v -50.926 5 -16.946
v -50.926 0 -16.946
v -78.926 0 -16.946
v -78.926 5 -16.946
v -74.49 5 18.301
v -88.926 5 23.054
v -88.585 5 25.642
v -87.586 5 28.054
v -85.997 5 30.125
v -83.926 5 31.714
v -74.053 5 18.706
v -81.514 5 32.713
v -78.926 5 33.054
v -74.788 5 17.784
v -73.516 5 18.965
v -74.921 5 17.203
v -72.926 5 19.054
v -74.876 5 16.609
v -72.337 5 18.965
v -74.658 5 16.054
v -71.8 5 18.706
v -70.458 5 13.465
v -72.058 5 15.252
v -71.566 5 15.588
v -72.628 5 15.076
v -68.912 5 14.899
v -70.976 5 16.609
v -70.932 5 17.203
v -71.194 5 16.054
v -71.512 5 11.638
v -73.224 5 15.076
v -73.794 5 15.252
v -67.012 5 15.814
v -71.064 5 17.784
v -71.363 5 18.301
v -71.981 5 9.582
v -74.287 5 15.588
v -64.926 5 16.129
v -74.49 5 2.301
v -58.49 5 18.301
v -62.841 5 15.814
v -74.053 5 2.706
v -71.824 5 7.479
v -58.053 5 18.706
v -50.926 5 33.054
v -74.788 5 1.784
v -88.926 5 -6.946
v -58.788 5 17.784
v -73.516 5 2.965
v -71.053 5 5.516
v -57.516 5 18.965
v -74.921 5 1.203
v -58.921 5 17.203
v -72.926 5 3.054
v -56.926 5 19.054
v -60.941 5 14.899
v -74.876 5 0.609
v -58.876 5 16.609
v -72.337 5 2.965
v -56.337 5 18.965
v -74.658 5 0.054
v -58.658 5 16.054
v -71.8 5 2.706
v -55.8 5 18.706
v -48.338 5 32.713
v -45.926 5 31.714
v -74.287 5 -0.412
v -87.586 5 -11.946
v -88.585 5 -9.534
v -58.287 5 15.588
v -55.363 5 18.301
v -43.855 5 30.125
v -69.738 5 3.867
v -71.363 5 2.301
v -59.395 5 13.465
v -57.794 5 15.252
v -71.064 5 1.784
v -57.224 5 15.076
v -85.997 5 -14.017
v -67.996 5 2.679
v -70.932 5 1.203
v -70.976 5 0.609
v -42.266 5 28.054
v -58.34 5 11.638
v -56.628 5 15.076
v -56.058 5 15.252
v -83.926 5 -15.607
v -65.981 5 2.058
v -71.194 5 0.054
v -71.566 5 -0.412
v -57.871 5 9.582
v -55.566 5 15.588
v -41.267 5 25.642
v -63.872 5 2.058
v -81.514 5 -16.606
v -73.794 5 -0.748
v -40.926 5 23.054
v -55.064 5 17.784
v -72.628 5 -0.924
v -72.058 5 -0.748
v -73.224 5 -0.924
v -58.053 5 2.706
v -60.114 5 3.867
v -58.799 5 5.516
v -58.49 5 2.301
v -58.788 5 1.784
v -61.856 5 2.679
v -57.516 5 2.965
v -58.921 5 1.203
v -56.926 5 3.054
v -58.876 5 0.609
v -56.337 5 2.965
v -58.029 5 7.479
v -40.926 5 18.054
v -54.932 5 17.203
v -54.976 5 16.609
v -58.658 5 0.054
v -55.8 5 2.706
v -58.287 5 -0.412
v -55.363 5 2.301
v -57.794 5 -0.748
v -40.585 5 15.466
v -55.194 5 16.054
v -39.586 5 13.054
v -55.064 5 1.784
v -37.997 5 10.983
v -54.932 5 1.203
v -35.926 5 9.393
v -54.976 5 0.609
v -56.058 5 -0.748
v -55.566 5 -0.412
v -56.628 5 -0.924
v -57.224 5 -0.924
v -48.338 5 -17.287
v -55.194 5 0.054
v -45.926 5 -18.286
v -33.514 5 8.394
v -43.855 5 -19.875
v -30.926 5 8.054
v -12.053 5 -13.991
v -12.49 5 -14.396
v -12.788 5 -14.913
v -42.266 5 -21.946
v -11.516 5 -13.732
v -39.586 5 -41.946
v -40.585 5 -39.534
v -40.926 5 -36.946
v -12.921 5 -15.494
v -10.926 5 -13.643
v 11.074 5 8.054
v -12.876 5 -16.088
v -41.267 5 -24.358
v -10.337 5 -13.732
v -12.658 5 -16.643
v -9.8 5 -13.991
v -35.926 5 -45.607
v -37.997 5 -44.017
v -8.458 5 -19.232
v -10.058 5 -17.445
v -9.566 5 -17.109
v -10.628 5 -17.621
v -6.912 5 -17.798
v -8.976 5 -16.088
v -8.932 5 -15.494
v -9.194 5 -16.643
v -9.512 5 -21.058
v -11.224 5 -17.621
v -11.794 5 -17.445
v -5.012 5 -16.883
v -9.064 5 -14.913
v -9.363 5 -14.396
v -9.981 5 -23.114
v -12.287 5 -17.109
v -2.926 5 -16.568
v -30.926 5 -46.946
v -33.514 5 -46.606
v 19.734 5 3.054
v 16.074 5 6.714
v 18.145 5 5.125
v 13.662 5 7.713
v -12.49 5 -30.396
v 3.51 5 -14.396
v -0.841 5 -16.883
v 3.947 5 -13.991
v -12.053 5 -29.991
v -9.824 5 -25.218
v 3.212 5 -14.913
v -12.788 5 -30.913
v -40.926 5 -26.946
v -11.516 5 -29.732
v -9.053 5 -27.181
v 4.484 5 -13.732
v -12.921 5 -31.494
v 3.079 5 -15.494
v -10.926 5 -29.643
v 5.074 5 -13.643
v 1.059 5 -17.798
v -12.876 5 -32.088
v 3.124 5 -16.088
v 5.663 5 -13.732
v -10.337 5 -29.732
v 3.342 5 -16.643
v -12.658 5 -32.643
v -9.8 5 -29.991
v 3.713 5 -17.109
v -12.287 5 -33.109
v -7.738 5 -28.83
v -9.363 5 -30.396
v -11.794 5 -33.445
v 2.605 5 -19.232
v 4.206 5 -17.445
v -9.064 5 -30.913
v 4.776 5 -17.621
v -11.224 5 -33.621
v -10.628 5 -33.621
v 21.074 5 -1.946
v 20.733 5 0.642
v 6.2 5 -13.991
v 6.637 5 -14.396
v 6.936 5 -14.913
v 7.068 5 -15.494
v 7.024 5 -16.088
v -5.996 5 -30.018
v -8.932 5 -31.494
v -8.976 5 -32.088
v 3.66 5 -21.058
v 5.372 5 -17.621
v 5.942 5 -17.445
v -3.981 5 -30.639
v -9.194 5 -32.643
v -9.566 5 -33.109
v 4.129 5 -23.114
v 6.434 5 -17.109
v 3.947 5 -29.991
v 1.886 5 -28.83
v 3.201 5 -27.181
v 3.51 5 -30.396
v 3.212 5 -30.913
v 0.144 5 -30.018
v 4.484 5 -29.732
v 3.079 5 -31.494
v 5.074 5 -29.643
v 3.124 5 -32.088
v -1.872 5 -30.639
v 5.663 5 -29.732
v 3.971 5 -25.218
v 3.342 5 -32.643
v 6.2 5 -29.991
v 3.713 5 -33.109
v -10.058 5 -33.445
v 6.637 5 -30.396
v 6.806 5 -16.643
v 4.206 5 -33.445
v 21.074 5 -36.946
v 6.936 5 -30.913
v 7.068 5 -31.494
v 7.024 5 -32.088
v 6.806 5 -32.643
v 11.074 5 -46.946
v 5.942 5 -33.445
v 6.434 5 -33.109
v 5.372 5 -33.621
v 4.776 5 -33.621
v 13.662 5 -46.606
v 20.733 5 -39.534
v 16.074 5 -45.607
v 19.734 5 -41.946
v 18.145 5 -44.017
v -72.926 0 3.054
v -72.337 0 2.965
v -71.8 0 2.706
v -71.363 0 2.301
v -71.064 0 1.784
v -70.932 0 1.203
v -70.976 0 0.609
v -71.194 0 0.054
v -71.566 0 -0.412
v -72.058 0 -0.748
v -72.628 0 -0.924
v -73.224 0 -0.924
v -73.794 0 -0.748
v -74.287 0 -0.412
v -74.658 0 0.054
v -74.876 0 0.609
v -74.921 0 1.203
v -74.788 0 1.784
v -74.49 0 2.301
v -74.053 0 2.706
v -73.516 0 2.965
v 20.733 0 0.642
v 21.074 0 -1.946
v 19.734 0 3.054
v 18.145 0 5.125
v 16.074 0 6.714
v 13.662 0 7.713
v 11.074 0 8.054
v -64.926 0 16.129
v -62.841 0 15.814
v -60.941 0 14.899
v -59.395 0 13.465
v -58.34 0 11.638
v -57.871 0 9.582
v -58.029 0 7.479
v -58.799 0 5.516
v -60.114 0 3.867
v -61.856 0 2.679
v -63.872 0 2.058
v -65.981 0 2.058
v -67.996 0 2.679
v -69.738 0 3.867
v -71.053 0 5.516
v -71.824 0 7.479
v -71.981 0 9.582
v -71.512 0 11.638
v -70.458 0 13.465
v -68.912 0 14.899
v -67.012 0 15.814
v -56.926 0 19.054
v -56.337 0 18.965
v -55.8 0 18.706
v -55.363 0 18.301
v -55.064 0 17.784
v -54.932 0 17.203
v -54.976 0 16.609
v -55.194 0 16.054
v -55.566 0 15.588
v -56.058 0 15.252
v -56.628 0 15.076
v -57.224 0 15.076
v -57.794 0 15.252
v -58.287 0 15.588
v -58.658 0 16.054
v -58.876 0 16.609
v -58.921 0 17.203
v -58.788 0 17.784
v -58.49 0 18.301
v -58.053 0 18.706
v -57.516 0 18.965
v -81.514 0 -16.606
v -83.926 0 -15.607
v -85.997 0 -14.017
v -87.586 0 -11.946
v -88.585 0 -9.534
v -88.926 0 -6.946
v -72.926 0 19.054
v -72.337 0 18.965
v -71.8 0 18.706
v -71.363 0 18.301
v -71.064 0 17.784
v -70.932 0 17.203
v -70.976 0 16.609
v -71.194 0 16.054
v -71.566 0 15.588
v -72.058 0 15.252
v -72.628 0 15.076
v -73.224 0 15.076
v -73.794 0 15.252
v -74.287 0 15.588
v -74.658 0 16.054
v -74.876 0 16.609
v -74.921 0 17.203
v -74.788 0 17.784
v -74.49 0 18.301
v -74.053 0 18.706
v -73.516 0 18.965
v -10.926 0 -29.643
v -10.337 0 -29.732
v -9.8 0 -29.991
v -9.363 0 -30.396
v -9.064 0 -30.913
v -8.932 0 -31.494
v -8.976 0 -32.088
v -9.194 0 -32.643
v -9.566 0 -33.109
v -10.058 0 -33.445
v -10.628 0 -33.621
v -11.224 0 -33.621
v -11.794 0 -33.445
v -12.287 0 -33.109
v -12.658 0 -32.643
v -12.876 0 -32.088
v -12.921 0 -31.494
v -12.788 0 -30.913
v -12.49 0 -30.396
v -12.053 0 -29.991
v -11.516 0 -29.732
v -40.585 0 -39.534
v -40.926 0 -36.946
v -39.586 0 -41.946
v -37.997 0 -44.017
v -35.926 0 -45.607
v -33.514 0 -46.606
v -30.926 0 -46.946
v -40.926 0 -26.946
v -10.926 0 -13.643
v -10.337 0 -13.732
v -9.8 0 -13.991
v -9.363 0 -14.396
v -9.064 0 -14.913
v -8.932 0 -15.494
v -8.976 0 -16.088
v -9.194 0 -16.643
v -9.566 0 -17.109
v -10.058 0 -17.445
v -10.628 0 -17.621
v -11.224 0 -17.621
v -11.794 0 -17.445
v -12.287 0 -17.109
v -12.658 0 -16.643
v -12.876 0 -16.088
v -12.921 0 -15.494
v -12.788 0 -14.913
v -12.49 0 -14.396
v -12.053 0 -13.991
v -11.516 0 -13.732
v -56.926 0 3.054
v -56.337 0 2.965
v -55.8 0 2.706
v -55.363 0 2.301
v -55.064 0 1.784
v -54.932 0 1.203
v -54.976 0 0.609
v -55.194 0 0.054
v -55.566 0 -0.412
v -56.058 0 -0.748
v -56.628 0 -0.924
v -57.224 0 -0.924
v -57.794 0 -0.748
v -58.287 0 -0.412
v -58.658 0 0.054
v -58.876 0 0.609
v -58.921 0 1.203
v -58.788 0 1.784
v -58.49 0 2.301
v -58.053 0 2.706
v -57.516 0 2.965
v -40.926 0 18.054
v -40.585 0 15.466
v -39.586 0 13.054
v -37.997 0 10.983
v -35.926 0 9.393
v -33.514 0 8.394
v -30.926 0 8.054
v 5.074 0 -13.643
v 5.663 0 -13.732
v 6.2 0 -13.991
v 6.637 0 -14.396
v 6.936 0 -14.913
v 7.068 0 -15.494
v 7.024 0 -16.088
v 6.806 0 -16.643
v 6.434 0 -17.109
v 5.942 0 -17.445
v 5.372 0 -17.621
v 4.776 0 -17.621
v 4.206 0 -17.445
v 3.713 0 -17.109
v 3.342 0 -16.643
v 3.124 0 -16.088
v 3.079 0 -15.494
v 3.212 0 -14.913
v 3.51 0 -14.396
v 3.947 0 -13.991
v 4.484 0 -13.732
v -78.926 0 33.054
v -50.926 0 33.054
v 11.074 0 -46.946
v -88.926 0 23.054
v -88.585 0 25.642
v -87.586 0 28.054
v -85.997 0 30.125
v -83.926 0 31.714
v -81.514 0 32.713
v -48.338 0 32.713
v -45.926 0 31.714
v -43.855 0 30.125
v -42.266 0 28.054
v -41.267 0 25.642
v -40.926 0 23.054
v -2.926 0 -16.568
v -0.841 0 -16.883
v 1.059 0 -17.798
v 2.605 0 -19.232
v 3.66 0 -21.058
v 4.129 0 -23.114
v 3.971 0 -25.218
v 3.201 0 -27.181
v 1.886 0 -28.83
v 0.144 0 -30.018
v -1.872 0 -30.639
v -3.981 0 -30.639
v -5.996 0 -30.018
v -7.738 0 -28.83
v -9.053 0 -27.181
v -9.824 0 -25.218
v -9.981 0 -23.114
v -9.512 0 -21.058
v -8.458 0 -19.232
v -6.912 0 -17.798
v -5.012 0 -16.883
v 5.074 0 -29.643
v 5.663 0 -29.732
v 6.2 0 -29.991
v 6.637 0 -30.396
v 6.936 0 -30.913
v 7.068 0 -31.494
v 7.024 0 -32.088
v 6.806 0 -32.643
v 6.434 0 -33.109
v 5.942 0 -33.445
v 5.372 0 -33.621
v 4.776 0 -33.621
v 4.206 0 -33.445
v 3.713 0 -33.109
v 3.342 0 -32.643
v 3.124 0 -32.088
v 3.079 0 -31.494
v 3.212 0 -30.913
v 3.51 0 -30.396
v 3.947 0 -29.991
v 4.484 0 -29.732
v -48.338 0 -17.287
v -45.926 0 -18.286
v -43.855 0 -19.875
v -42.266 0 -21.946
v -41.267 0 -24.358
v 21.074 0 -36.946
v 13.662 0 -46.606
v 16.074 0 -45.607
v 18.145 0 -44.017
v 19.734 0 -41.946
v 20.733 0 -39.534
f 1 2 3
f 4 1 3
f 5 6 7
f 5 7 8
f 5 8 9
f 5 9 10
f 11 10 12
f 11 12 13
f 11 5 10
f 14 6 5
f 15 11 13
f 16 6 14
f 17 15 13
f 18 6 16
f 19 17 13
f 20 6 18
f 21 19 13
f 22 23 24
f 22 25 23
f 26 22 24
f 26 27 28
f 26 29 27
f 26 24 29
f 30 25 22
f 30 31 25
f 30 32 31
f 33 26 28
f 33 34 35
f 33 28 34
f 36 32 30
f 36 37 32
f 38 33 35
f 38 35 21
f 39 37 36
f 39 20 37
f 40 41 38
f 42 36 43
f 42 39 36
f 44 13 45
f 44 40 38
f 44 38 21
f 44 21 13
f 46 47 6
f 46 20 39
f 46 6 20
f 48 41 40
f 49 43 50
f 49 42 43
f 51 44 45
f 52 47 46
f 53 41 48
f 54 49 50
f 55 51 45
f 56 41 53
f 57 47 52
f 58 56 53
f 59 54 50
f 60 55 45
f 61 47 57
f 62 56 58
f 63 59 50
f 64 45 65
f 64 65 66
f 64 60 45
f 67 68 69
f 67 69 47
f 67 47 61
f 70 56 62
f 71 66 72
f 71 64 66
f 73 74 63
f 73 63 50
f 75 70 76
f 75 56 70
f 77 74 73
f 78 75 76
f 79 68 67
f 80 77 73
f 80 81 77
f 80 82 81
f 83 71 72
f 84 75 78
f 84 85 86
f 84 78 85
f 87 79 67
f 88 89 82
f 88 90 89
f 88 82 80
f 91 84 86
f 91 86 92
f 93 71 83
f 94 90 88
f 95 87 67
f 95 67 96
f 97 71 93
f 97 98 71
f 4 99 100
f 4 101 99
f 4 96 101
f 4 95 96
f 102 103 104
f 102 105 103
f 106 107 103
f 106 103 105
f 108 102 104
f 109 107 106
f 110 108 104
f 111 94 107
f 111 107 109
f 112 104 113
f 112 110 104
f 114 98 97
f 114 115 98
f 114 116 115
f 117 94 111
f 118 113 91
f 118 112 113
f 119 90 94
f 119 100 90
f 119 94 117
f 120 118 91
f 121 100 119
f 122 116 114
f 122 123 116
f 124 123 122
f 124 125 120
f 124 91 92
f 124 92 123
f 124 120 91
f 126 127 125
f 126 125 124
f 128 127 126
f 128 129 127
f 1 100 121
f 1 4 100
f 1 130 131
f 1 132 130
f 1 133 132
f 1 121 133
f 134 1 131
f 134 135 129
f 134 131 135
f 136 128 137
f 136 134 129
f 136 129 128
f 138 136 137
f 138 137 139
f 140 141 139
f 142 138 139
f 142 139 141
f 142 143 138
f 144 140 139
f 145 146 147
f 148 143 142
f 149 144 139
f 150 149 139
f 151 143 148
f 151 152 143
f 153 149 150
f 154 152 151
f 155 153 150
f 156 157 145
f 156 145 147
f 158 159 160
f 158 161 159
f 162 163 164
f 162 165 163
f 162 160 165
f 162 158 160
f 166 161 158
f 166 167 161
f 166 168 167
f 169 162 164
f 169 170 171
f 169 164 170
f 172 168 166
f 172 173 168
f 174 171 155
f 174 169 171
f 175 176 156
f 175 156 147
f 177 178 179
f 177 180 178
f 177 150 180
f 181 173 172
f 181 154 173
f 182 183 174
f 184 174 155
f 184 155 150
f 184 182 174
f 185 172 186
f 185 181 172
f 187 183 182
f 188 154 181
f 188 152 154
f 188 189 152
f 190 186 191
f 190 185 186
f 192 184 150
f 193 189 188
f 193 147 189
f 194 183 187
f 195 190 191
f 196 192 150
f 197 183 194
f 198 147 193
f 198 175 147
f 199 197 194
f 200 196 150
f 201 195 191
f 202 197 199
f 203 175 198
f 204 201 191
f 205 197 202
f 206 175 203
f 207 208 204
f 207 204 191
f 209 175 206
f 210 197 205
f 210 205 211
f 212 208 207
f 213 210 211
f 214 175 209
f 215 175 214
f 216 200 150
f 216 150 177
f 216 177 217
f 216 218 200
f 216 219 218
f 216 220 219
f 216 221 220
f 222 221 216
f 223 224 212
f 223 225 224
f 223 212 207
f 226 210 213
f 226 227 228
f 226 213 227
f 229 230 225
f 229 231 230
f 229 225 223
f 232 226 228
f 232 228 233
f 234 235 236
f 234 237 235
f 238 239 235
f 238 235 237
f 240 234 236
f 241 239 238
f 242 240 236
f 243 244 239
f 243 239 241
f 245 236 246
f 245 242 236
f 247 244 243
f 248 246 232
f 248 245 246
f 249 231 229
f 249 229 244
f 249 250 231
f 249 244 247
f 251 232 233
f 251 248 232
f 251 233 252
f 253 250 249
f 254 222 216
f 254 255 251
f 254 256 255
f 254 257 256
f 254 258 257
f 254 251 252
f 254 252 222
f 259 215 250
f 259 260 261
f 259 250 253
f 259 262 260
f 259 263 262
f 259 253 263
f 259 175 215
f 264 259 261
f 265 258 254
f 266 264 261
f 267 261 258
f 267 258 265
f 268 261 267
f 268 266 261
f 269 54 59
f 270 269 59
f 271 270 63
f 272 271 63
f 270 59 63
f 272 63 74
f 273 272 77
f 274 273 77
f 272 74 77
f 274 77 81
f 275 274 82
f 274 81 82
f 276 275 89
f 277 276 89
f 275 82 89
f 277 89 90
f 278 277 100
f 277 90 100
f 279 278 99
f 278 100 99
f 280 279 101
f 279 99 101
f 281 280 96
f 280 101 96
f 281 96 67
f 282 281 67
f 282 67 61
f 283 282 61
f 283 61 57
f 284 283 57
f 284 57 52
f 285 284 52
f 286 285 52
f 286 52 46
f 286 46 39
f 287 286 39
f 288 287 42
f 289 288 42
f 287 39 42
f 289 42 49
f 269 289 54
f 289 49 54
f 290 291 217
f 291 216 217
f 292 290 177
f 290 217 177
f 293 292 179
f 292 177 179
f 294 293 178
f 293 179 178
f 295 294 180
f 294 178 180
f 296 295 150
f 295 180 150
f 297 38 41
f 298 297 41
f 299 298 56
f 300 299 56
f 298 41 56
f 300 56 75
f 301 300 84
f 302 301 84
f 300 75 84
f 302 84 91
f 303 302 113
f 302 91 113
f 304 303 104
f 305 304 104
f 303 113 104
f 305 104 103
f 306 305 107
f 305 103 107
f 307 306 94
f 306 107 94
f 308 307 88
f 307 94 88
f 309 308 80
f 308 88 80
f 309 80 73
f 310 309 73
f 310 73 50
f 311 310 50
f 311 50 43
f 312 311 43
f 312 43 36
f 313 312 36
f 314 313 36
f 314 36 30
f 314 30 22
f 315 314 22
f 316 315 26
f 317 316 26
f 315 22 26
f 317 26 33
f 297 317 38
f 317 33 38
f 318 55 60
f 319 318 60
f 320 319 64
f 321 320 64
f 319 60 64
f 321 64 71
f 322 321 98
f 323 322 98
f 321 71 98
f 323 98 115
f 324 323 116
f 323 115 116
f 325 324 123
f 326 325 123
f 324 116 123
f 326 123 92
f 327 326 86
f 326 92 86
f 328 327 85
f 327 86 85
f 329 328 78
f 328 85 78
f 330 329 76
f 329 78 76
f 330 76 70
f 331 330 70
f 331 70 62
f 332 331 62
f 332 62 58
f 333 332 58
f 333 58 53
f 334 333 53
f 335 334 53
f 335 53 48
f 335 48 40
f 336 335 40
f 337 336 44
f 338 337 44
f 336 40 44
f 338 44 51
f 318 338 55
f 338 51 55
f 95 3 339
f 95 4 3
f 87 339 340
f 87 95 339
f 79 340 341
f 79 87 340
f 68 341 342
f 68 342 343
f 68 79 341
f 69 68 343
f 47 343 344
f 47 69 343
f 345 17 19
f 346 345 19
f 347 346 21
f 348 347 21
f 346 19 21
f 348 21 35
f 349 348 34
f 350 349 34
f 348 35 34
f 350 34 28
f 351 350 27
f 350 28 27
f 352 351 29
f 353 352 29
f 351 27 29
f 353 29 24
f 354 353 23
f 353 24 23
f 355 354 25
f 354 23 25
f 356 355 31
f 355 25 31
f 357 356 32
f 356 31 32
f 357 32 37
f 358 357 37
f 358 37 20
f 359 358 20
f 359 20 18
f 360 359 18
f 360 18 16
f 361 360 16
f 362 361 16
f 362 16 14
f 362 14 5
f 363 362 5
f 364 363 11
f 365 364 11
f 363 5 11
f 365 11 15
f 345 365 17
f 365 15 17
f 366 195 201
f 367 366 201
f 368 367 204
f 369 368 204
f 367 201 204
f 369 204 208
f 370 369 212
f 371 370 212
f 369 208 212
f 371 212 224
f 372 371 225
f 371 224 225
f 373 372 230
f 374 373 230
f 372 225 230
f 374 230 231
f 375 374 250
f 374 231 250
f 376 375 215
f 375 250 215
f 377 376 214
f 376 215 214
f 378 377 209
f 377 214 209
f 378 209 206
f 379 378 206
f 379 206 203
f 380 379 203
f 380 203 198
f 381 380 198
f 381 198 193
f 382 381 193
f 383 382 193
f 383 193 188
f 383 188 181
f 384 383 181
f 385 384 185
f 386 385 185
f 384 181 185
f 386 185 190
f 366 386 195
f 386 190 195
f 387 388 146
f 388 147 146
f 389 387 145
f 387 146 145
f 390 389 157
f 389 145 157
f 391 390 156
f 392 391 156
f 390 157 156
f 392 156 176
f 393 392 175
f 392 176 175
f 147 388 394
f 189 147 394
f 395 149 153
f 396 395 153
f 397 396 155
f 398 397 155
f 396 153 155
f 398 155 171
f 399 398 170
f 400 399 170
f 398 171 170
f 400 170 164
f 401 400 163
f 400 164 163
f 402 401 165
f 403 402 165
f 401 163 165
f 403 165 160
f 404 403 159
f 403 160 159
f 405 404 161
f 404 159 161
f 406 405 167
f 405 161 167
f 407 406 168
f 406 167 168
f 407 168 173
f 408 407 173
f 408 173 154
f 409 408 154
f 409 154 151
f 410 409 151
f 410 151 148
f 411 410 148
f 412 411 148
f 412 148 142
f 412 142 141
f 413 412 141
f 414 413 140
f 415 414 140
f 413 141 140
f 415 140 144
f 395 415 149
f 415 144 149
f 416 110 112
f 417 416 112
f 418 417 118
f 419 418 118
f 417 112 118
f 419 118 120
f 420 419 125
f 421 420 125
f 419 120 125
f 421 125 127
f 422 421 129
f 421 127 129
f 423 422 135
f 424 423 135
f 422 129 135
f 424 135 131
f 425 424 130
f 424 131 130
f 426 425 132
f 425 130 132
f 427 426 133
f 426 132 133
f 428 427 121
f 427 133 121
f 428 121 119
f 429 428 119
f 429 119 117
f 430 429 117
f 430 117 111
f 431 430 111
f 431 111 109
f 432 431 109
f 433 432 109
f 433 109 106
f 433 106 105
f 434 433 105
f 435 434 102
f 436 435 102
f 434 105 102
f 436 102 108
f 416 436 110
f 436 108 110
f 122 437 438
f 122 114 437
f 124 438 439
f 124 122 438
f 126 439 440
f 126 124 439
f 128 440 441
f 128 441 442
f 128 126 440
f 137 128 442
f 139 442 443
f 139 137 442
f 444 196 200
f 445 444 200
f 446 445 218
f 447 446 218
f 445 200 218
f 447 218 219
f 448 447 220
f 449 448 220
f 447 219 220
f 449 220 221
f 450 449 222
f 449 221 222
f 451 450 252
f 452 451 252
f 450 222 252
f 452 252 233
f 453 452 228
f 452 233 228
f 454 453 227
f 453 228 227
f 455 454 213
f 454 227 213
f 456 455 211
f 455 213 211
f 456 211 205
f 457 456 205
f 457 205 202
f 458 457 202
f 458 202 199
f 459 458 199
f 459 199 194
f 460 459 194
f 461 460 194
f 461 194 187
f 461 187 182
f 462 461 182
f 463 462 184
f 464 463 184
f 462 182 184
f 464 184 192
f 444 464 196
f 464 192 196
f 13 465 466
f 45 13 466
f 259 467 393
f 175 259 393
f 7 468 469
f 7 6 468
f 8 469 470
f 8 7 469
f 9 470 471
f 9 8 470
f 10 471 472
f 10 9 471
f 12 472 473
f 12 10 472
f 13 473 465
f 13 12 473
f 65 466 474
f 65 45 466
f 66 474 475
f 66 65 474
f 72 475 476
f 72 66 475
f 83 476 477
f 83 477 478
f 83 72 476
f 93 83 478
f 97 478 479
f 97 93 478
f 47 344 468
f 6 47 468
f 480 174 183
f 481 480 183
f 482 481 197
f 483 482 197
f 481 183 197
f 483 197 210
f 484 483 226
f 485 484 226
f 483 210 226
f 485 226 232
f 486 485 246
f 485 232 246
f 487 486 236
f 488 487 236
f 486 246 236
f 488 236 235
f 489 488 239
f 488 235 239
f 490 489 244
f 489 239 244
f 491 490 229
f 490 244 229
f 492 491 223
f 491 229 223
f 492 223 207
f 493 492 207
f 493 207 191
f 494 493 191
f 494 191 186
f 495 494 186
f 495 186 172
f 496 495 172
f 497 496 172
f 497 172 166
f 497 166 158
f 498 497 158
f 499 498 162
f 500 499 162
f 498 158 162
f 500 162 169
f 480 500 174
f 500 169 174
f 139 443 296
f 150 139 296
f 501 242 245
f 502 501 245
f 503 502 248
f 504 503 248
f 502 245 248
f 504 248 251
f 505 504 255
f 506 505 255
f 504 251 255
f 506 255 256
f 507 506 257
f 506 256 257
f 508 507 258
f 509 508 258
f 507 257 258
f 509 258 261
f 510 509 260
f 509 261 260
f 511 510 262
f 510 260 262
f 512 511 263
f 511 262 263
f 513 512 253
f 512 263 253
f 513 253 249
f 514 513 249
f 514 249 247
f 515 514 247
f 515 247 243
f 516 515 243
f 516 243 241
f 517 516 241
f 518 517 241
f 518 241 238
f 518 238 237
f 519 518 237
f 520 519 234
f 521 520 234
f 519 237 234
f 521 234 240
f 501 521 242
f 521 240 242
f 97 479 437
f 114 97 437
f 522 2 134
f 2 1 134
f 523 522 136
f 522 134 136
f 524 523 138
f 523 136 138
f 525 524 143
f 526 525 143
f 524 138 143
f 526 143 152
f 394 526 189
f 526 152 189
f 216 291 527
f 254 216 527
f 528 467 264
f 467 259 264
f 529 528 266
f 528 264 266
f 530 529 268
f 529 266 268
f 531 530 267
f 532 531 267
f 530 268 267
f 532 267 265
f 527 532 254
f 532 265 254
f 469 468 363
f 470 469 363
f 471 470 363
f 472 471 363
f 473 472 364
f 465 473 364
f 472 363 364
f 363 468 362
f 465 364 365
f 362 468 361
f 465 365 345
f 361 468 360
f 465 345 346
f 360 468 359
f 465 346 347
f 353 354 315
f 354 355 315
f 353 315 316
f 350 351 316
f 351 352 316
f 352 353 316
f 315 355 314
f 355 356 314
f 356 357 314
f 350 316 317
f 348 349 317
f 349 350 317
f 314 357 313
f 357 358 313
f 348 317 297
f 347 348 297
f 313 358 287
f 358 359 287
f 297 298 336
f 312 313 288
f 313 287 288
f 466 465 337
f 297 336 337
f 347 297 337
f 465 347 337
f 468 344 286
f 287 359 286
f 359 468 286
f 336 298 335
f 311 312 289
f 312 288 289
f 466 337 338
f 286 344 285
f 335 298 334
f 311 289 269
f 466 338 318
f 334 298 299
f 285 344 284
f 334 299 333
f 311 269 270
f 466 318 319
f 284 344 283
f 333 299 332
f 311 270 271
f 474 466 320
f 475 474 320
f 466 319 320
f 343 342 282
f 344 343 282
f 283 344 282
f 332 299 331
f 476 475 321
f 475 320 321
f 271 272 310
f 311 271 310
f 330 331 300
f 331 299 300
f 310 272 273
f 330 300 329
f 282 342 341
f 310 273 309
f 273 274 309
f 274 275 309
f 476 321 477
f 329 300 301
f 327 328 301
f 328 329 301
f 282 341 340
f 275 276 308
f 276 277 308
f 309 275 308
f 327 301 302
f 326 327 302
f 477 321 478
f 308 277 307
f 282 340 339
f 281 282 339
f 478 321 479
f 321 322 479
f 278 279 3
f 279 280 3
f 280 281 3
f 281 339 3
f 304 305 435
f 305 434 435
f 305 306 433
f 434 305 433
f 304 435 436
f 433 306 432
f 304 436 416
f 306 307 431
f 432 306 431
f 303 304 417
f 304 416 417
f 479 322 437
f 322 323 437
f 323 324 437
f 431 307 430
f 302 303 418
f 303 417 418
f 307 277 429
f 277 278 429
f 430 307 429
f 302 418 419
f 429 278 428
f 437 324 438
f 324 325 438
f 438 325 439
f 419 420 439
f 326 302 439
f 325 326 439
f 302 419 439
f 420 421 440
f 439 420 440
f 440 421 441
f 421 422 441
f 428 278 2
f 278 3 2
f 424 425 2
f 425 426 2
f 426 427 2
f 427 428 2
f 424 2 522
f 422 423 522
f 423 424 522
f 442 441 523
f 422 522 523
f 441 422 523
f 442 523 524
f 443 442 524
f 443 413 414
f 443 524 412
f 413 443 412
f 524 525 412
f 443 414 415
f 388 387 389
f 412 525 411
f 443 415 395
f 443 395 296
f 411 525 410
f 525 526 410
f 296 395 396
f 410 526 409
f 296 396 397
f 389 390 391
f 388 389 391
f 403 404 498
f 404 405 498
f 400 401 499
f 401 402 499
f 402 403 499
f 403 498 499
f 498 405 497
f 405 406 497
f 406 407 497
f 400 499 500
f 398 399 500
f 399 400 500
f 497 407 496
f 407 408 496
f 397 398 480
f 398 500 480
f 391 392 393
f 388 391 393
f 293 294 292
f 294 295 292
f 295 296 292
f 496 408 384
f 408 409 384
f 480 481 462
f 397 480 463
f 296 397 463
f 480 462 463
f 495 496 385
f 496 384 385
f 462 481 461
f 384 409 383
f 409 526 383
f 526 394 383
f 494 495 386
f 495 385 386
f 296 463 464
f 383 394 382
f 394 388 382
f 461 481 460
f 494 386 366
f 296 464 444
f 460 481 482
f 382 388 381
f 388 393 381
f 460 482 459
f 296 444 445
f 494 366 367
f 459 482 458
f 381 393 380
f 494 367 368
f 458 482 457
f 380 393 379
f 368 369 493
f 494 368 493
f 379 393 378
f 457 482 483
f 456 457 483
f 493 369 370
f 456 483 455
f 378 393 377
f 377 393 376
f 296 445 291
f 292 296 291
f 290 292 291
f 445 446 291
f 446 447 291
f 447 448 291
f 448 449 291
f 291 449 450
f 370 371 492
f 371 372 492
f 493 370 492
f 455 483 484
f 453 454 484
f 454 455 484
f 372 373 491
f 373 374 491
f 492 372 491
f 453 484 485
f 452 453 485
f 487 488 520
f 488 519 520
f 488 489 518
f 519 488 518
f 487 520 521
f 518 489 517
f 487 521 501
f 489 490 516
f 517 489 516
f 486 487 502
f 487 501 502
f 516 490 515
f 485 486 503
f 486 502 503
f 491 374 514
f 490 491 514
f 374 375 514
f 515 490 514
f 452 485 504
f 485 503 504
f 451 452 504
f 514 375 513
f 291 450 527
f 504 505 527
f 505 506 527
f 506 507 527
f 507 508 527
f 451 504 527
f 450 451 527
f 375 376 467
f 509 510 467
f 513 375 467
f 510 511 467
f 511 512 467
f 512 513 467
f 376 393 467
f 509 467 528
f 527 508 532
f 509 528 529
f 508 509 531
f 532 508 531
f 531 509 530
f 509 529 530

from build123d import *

# Parameters (mm, degrees)
BOSS_EXTRUDE1_DEPTH = 5
SKETCH2_R           = 7.075
SKETCH2_R_2         = 2
CUT_EXTRUDE1_DEPTH  = 5
FILLET1_R           = 10
FILLET2_R           = 10


with BuildPart() as part:
    # Sketch1 → Boss-Extrude1 (new body)
    with BuildSketch(Plane(origin=(0, 0, 0), x_dir=(1, 0, 0), z_dir=(0, 1, 0))):
        Polygon((-40.926174497, 16.946308725), (-88.926174497, 16.946308725), (-88.926174497, -33.053691275), (-40.926174497, -33.053691275), (-40.926174497, -8.053691275), (-30.926174497, -8.053691275), (-13.571066073, -8.053691275), (21.073825503, -8.053691275), (21.073825503, 46.946308725), (-30.926174497, 46.946308725), (-40.926174497, 46.946308725), align=None)
    extrude(amount=BOSS_EXTRUDE1_DEPTH)

    # Sketch2 → Cut-Extrude1 (cut)
    with BuildSketch(Plane(origin=(0, 5, 0), x_dir=(1, 0, 0), z_dir=(0, 1, 0))):
        with Locations(Location((-64.926174497, -9.053691275, 0), (0, 0, 270))):
            Circle(SKETCH2_R)
        with Locations(Location((-72.926174497, -1.053691275, 0), (0, 0, 270))):
            Circle(SKETCH2_R_2)
        with Locations(Location((-56.926174497, -1.053691275, 0), (0, 0, 270))):
            Circle(SKETCH2_R_2)
        with Locations(Location((-56.926174497, -17.053691275, 0), (0, 0, 270))):
            Circle(SKETCH2_R_2)
        with Locations(Location((-72.926174497, -17.053691275, 0), (0, 0, 270))):
            Circle(SKETCH2_R_2)
        with Locations(Location((-2.926174497, 23.643183553, 0), (0, 0, 270))):
            Circle(SKETCH2_R)
        with Locations(Location((5.073825503, 31.643183553, 0), (0, 0, 270))):
            Circle(SKETCH2_R_2)
        with Locations(Location((-10.926174497, 15.643183553, 0), (0, 0, 270))):
            Circle(SKETCH2_R_2)
        with Locations(Location((-10.926174497, 31.643183553, 0), (0, 0, 270))):
            Circle(SKETCH2_R_2)
        with Locations(Location((5.073825503, 15.643183553, 0), (0, 0, 270))):
            Circle(SKETCH2_R_2)
    extrude(amount=-CUT_EXTRUDE1_DEPTH, mode=Mode.SUBTRACT)

    # Fillet1
    fillet1_edges = [part.edges().sort_by_distance(p)[0] for p in [
        (-88.926174497, 2.5, -16.946308725),
    ]]
    fillet(fillet1_edges, radius=FILLET1_R)

    # Fillet2
    fillet2_edges = [part.edges().sort_by_distance(p)[0] for p in [
        (21.073825503, 2.5, -46.946308725),
        (21.073825503, 2.5, 8.053691275),
        (-40.926174497, 2.5, 8.053691275),
        (-40.926174497, 2.5, 33.053691275),
        (-88.926174497, 2.5, 33.053691275),
        (-40.926174497, 2.5, -16.946308725),
        (-40.926174497, 2.5, -46.946308725),
    ]]
    fillet(fillet2_edges, radius=FILLET2_R)


solid = part.part
